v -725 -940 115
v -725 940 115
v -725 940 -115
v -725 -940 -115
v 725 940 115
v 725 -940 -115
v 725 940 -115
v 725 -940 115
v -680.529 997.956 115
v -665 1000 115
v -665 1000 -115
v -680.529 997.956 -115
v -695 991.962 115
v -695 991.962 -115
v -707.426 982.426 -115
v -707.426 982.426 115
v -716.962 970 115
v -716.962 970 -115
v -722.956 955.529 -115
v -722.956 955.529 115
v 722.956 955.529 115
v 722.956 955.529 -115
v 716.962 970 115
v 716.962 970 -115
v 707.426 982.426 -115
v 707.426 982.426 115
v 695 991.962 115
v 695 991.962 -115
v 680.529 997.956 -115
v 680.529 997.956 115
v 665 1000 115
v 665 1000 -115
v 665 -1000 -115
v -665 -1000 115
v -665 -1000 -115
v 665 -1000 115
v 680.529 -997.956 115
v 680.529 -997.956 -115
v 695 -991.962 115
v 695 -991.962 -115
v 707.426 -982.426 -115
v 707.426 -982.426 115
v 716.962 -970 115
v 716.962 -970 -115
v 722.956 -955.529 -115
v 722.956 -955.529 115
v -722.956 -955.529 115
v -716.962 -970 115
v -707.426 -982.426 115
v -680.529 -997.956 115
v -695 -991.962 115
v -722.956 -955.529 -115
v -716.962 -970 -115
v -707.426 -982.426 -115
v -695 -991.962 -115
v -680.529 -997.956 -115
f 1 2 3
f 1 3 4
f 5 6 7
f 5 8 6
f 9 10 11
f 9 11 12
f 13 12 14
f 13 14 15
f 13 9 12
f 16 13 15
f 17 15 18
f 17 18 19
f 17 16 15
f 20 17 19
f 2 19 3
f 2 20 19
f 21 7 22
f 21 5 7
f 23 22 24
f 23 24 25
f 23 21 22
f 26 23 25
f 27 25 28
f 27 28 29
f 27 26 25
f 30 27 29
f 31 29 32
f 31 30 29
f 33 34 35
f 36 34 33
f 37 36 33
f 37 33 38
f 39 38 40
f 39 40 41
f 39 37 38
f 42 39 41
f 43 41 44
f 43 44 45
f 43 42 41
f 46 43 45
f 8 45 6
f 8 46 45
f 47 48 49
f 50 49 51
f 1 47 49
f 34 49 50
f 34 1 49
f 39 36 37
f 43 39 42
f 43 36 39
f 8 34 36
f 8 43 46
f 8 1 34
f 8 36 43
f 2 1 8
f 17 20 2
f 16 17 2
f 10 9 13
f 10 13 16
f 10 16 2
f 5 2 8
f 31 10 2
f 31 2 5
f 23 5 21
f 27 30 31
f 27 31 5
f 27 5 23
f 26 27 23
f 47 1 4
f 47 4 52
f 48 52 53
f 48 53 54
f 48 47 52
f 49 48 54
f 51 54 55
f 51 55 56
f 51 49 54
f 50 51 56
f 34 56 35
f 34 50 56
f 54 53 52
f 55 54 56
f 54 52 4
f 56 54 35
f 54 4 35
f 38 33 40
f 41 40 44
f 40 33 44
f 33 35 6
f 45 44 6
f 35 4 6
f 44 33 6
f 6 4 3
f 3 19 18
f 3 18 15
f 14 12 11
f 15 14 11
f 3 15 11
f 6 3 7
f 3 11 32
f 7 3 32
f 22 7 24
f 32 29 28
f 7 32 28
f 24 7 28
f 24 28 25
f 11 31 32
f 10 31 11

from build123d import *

# Parameters (mm, degrees)
F1_DEPTH = 115


with BuildPart() as f1:
    # F0 (on Top) → F1 (new body, symmetric)
    with BuildSketch(Plane.XY):
        with BuildLine():
            Line((665, 1000), (-665, 1000))
            ThreePointArc((-665, 1000), (-707.426407, 982.426407), (-725, 940))
            Line((-725, 940), (-725, -940))
            ThreePointArc((-725, -940), (-707.426407, -982.426407), (-665, -1000))
            Line((-665, -1000), (665, -1000))
            ThreePointArc((665, -1000), (707.426407, -982.426407), (725, -940))
            Line((725, -940), (725, 940))
            ThreePointArc((725, 940), (707.426407, 982.426407), (665, 1000))
        make_face()
    extrude(amount=F1_DEPTH, both=True)


solid = f1.part
